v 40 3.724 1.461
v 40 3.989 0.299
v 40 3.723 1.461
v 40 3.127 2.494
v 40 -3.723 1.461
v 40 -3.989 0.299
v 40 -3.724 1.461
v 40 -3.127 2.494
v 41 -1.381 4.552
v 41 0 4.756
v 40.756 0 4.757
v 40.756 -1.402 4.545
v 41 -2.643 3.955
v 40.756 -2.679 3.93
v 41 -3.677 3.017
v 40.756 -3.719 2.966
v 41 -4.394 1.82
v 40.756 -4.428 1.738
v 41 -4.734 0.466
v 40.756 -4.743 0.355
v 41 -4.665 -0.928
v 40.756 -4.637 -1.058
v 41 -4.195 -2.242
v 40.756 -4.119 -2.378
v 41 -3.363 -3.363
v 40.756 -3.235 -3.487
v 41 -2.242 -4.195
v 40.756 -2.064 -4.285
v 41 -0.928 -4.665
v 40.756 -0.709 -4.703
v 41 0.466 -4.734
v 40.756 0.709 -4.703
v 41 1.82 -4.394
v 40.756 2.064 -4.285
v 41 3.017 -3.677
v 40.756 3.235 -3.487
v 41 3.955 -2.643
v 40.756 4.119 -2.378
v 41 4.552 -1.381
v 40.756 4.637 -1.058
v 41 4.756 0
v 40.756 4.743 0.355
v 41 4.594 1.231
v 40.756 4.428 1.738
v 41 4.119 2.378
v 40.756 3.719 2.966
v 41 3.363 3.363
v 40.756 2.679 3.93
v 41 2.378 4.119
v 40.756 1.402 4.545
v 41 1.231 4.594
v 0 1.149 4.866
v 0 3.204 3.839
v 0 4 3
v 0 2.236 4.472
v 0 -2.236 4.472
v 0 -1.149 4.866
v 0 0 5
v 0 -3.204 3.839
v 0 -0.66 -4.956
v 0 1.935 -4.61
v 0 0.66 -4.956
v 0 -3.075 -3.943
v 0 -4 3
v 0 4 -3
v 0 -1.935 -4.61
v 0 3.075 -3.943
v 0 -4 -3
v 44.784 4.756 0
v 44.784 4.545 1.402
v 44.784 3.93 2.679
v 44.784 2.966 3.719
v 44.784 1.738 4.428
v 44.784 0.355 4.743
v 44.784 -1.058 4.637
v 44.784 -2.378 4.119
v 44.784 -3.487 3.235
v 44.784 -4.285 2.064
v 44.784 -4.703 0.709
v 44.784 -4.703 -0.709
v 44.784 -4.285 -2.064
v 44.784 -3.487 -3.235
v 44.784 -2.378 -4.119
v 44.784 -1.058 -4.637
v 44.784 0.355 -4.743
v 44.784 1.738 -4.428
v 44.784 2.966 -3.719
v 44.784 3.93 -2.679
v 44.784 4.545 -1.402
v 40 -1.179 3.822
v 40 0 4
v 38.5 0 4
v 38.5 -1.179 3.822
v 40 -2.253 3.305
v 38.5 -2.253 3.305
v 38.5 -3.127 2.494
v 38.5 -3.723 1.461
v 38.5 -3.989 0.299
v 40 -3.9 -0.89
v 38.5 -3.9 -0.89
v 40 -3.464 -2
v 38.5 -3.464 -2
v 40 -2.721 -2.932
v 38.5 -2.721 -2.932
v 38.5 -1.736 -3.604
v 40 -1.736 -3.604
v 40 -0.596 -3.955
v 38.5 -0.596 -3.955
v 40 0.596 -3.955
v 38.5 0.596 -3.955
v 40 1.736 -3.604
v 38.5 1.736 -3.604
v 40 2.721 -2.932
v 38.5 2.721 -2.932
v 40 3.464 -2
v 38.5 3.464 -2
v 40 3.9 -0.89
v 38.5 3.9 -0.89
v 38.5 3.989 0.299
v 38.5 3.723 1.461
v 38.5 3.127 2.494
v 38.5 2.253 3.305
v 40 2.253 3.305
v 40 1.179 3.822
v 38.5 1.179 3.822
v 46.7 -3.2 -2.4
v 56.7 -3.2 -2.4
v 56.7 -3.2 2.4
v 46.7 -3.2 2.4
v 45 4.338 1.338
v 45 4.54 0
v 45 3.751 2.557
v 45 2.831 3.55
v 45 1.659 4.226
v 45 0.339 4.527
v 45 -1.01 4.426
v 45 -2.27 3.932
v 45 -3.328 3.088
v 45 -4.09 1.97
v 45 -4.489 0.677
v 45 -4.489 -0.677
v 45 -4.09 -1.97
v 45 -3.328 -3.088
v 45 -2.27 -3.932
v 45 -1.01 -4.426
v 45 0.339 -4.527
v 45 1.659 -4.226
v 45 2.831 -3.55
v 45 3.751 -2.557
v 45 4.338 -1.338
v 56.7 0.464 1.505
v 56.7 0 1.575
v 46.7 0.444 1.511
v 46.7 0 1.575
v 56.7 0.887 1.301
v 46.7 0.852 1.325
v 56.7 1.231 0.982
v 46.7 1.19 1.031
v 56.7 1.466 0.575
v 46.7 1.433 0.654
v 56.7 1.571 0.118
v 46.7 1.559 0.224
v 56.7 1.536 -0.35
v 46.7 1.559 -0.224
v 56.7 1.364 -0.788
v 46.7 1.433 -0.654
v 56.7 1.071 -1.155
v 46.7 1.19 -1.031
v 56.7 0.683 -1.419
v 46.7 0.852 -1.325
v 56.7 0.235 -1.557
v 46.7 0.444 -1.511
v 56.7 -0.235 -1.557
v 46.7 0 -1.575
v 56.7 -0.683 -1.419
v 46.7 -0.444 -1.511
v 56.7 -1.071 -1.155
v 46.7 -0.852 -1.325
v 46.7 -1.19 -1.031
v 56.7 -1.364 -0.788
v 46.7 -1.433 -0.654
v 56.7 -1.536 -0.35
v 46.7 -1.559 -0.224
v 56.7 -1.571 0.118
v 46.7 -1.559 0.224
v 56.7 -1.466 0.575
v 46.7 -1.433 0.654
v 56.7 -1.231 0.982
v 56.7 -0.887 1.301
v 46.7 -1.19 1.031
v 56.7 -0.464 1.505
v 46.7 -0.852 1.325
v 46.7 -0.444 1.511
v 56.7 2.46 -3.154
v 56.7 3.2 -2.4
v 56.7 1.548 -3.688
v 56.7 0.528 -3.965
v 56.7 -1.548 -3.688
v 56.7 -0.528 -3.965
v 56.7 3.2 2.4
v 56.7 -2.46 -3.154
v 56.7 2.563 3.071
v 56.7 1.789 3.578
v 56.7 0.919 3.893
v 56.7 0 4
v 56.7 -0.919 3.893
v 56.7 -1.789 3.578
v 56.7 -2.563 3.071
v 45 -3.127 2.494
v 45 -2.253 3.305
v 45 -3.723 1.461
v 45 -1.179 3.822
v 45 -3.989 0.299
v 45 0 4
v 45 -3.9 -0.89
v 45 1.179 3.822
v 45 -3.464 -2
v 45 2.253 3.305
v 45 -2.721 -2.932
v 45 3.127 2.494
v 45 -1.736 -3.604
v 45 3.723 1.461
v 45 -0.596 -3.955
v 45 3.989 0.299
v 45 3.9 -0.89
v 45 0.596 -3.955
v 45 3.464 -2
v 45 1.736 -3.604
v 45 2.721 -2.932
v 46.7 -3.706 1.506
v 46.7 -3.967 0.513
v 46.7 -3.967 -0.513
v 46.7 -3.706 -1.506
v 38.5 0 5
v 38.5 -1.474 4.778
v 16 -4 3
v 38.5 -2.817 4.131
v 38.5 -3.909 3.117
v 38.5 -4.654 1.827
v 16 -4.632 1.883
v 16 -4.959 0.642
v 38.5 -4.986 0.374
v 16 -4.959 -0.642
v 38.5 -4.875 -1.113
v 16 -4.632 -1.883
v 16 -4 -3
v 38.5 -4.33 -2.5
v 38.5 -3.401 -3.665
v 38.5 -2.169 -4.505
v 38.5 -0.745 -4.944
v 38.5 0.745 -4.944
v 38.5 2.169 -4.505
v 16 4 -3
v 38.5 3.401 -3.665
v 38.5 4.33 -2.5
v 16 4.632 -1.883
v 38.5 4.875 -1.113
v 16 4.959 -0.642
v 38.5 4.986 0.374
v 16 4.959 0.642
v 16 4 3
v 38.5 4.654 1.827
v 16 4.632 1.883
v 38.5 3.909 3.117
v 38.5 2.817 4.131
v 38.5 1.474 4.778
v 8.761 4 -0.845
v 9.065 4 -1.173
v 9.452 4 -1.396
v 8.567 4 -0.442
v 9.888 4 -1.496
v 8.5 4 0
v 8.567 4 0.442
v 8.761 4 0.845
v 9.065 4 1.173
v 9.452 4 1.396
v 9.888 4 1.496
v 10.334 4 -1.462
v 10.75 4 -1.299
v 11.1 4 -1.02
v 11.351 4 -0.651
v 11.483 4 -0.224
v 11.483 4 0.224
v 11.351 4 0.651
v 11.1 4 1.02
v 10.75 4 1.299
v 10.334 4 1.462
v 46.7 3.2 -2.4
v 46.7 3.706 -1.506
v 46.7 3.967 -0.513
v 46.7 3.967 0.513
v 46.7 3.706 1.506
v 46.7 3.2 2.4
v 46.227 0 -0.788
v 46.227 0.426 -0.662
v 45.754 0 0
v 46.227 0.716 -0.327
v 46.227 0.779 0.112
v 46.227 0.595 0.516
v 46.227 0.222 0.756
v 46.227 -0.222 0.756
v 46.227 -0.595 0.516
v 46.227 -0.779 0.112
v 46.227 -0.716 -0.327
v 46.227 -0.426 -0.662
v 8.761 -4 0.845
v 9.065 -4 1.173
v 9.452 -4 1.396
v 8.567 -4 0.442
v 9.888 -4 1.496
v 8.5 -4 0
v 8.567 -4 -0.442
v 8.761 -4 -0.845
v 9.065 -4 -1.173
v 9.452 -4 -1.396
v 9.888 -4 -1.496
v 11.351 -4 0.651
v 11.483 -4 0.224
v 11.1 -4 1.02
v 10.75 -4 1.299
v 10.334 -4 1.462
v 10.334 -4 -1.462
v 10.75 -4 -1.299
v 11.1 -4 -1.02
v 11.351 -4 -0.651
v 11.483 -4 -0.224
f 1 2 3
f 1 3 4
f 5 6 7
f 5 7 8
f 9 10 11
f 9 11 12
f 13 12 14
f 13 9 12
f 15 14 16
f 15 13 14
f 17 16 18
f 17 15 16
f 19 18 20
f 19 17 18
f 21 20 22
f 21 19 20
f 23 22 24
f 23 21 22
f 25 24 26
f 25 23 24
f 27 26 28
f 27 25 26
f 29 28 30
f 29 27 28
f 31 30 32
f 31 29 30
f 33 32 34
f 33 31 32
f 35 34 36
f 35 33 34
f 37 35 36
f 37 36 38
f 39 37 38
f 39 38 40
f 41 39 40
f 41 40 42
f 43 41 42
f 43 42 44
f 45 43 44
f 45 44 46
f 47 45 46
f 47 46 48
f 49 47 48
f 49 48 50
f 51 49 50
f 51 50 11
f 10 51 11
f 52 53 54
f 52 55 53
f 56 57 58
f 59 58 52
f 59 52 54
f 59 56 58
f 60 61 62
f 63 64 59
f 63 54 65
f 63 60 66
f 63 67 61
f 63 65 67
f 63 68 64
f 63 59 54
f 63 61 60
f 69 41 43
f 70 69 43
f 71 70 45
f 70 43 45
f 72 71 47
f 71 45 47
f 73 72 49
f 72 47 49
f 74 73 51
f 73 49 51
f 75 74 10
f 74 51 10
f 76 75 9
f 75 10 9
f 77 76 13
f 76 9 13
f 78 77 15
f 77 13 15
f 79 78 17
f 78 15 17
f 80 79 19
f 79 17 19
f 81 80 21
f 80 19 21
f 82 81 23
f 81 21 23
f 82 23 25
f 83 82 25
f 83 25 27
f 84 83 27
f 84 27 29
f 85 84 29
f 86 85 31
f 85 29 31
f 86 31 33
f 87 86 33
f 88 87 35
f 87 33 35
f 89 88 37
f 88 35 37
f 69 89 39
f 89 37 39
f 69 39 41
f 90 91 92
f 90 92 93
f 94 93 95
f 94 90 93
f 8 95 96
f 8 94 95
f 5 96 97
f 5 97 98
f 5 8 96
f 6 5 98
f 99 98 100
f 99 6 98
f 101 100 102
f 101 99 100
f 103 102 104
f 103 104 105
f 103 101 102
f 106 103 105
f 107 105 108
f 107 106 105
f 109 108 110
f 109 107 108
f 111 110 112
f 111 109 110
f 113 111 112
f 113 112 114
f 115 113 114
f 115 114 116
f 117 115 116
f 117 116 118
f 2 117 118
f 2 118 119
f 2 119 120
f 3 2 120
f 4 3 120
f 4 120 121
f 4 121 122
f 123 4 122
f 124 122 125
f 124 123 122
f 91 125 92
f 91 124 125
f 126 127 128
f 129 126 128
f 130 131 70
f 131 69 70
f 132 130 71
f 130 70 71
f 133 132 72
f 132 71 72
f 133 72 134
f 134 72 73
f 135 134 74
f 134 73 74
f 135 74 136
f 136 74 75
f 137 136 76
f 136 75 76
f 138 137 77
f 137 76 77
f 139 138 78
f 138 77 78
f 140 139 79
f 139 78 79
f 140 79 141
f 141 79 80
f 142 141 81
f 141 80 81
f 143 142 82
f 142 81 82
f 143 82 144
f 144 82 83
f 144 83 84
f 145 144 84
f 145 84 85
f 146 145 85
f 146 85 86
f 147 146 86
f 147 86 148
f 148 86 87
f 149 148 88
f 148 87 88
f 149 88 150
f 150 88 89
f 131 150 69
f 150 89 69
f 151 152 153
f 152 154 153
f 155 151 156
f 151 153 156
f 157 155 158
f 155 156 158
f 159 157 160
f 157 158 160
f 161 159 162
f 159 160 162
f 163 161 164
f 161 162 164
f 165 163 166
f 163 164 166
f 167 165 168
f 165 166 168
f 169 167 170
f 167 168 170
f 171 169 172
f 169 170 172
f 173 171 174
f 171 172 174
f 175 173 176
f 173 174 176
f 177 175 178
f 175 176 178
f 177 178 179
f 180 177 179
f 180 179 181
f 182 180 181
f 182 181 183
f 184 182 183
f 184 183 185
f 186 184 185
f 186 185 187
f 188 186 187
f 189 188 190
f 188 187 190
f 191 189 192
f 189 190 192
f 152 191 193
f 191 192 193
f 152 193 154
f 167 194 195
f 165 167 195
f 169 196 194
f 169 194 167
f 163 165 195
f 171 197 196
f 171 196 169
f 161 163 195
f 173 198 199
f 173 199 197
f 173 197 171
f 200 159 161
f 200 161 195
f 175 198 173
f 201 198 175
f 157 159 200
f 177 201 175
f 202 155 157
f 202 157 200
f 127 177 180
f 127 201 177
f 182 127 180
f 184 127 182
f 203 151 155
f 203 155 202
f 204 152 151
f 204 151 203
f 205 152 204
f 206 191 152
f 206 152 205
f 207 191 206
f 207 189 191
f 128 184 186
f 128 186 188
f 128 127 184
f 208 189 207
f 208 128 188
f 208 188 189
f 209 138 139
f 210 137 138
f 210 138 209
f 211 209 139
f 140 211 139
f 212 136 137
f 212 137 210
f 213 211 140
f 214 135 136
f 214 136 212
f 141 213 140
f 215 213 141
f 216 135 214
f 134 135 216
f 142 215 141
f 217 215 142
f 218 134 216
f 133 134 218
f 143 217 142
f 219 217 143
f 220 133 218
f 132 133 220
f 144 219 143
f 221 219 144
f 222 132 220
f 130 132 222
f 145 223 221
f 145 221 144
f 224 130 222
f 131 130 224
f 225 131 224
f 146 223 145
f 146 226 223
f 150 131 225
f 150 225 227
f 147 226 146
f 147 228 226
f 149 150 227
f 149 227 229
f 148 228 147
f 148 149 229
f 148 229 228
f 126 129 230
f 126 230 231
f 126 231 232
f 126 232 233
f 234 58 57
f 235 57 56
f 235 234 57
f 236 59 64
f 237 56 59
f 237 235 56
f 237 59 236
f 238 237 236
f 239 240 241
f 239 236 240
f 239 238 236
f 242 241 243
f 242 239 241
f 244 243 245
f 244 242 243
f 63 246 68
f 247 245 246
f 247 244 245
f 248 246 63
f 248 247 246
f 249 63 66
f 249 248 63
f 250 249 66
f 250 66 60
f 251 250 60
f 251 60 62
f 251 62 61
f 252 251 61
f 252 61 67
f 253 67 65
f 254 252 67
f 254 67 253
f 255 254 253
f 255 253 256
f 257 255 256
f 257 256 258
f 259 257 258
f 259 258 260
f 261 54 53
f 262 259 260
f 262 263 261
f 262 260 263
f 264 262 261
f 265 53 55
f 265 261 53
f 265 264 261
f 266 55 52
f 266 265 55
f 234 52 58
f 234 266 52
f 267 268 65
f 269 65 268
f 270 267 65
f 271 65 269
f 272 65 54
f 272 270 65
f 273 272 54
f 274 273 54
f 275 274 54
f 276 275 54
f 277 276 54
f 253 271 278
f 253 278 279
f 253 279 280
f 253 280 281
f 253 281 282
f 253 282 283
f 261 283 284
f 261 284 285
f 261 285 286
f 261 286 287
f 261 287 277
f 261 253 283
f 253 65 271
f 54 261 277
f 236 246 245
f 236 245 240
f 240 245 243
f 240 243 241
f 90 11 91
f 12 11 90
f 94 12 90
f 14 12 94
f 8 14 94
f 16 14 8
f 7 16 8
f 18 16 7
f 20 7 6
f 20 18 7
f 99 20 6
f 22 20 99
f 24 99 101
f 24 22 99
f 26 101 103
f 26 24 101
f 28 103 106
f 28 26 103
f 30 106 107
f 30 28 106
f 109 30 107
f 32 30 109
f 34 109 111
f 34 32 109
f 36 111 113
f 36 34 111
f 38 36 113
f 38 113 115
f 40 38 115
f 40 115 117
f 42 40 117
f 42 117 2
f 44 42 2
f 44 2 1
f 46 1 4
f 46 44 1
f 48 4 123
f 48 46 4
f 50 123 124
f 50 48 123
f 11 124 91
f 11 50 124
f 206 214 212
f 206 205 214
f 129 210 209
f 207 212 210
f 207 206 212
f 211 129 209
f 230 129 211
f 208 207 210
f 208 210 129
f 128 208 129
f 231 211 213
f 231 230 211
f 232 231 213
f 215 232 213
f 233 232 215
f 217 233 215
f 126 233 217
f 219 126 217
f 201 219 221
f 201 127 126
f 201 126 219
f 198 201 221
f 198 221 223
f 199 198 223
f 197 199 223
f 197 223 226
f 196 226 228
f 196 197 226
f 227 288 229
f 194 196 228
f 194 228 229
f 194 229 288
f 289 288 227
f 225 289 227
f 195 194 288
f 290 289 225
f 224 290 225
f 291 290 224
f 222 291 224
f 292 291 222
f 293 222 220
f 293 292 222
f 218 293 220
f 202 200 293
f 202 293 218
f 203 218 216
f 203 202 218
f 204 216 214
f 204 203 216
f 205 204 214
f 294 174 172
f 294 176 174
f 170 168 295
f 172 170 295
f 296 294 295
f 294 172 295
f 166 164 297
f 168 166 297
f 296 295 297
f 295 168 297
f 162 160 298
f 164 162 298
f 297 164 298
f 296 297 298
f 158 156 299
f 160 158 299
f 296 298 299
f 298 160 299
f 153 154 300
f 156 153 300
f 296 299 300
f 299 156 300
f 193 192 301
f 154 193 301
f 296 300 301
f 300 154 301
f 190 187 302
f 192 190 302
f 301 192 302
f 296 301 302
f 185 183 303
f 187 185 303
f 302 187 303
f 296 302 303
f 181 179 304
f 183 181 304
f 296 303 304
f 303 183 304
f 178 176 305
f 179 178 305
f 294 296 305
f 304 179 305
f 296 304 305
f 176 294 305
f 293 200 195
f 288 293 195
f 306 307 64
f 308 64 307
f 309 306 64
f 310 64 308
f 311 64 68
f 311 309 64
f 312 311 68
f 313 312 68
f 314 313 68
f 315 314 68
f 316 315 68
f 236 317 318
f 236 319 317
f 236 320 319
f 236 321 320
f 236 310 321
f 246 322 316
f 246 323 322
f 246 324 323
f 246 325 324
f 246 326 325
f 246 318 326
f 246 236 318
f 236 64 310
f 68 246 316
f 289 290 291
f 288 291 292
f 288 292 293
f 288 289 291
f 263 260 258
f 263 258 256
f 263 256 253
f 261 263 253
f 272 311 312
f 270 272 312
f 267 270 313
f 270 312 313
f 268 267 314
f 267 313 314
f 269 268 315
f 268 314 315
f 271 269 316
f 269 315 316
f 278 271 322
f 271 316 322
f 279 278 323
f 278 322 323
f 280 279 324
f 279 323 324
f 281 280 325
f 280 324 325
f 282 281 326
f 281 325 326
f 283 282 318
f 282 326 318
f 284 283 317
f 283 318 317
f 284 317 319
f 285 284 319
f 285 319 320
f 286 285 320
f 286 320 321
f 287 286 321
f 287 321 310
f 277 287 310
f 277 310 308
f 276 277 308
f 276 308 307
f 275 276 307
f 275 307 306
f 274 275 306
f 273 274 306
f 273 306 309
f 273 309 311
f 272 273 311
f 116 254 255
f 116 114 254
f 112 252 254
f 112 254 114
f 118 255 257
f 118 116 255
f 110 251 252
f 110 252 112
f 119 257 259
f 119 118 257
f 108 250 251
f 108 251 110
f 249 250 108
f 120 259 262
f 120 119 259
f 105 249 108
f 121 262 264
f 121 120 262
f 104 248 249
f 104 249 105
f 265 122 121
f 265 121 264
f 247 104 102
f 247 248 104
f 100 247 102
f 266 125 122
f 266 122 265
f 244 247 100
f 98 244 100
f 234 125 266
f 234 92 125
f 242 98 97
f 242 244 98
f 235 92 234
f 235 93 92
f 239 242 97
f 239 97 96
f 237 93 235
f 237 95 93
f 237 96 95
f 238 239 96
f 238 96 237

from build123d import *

# Parameters (mm, degrees)
CUT_EXTRUDE1_START               = -16
CUT_EXTRUDE1_DEPTH               = 16
F_3_0MM_DOWEL_HOLE1_D            = 3
CUT_EXTRUDE3_START               = -20
SKETCH17_R                       = 5
SKETCH17_R_2                     = 4
CUT_EXTRUDE3_DEPTH               = 1.5
CHAMFER2_SIZE                    = 1
SKETCH18_R                       = 4
CUT_EXTRUDE4_DEPTH               = 3.3
TAP_DRILL_FOR_M3_HELICOIL1_D     = 3.15
TAP_DRILL_FOR_M3_HELICOIL1_DEPTH = 10
TAP_DRILL_FOR_M3_HELICOIL1_TIP   = 0.946355475
CUT_EXTRUDE5_DEPTH               = 10
SKETCH24_R                       = 5
BOSS_EXTRUDE1_DEPTH              = 3
SKETCH26_R                       = 5
SKETCH26_R_2                     = 4.7565
CUT_EXTRUDE6_DEPTH               = 0.5


# Read off the part's stored shape, not the designer's step: M10x0.75 Machine Threads Stud1
with BuildPart() as part:
    # Sketch1 → Revolve1 (revolve)
    with BuildSketch(Plane.XY, mode=Mode.PRIVATE) as revolve1_sk:
        Polygon((0, 0), (0, 5), (45, 5), (45, 4), (60, 4), (60, 0), align=None)
    revolve(revolve1_sk.sketch.rotate(Axis((0, 0, 0), (1, 0, 0)), 90), axis=Axis((0, 0, 0), (1, 0, 0)))

    # Sketch2 → Cut-Extrude1 (cut)
    with BuildSketch(Plane.ZY.offset(CUT_EXTRUDE1_START)):
        with BuildLine():
            Line((-3, 4), (3, 4))
            ThreePointArc((3, 4), (0, 5), (-3, 4))
        make_face()
        with BuildLine():
            Line((3, -4), (-3, -4))
            ThreePointArc((-3, -4), (0, -5), (3, -4))
        make_face()
    extrude(amount=CUT_EXTRUDE1_DEPTH, mode=Mode.SUBTRACT)

    # Ø3.0mm Dowel Hole1 (through all)
    with Locations(Plane(origin=(0, 4, 0), x_dir=(1, 0, 0), z_dir=(0, 1, 0))):
        with Locations((10, 0)):
            Hole(F_3_0MM_DOWEL_HOLE1_D / 2)

    # Sketch17 → Cut-Extrude3 (cut)
    with BuildSketch(Plane(origin=(60, 0, 0), x_dir=(0, 0, -1), z_dir=(1, 0, 0)).offset(CUT_EXTRUDE3_START)):
        with Locations(Location((0, 0, 0), (0, 0, 180))):
            Circle(SKETCH17_R)
        with Locations(Location((0, 0, 0), (0, 0, 180))):
            Circle(SKETCH17_R_2, mode=Mode.SUBTRACT)
    extrude(amount=-CUT_EXTRUDE3_DEPTH, mode=Mode.SUBTRACT)

    # Chamfer2
    chamfer2_edges = [part.edges().sort_by_distance(p)[0] for p in [
        (40, 0, -5),
        (45, 0, -5),
    ]]
    chamfer(chamfer2_edges, length=CHAMFER2_SIZE - 0.0001)  # a hair under: the kernel refuses the full size

    # Sketch18 → Cut-Extrude4 (cut)
    with BuildSketch(Plane(origin=(60, 0, 0), x_dir=(0, 0, -1), z_dir=(1, 0, 0))):
        with Locations(Location((0, 0, 0), (0, 0, 180))):
            Circle(SKETCH18_R)
    extrude(amount=-CUT_EXTRUDE4_DEPTH, mode=Mode.SUBTRACT)

    # Tap Drill for M3 Helicoil1
    with Locations(Plane(origin=(56.7, 0, 0), x_dir=(0, 0, -1), z_dir=(1, 0, 0))):
        with Locations((0, 0)):
            Hole(TAP_DRILL_FOR_M3_HELICOIL1_D / 2, depth=TAP_DRILL_FOR_M3_HELICOIL1_DEPTH)
            with Locations((0, 0, -(TAP_DRILL_FOR_M3_HELICOIL1_DEPTH + TAP_DRILL_FOR_M3_HELICOIL1_TIP / 2))):  # 118° drill point
                Cone(0, TAP_DRILL_FOR_M3_HELICOIL1_D / 2, TAP_DRILL_FOR_M3_HELICOIL1_TIP, mode=Mode.SUBTRACT)

    # Sketch23 → Cut-Extrude5 (cut)
    with BuildSketch(Plane(origin=(56.7, 0, 0), x_dir=(0, 0, -1), z_dir=(1, 0, 0))):
        with BuildLine():
            ThreePointArc((2.4, 3.2), (0, 4), (-2.4, 3.2))
            Line((-2.4, 3.2), (2.4, 3.2))
        make_face()
        with BuildLine():
            Line((2.4, -3.2), (-2.4, -3.2))
            ThreePointArc((-2.4, -3.2), (0, -4), (2.4, -3.2))
        make_face()
    extrude(amount=-CUT_EXTRUDE5_DEPTH, mode=Mode.SUBTRACT)

    # Sketch24 → Boss-Extrude1 (add)
    with BuildSketch(Plane(origin=(45, 0, 0), x_dir=(0, 0, -1), z_dir=(1, 0, 0))):
        Circle(SKETCH24_R)
    extrude(amount=-BOSS_EXTRUDE1_DEPTH)

    # M10x0.75 Machine Threads Stud1 outline → M10x0.75 Machine Threads Stud1 (revolve, cut)
    with BuildSketch(Plane.YX):
        Polygon((5, 45), (4.54, 45), (4.7565, 44.7835), (4.7565, 41), (5, 41), align=None)
    revolve(axis=Axis((0, 0, 0), (1, 0, 0)), mode=Mode.SUBTRACT)

    # Sketch26 → Cut-Extrude6 (cut)
    with BuildSketch(Plane(origin=(41, 0, 0), x_dir=(0, 0, -1), z_dir=(1, 0, 0))):
        with Locations(Location((0, 0, 0), (0, 0, 126.869897646))):
            Circle(SKETCH26_R)
        with Locations(Location((0, 0, 0), (0, 0, 180))):
            Circle(SKETCH26_R_2, mode=Mode.SUBTRACT)
    extrude(amount=-CUT_EXTRUDE6_DEPTH, mode=Mode.SUBTRACT)


solid = part.part
